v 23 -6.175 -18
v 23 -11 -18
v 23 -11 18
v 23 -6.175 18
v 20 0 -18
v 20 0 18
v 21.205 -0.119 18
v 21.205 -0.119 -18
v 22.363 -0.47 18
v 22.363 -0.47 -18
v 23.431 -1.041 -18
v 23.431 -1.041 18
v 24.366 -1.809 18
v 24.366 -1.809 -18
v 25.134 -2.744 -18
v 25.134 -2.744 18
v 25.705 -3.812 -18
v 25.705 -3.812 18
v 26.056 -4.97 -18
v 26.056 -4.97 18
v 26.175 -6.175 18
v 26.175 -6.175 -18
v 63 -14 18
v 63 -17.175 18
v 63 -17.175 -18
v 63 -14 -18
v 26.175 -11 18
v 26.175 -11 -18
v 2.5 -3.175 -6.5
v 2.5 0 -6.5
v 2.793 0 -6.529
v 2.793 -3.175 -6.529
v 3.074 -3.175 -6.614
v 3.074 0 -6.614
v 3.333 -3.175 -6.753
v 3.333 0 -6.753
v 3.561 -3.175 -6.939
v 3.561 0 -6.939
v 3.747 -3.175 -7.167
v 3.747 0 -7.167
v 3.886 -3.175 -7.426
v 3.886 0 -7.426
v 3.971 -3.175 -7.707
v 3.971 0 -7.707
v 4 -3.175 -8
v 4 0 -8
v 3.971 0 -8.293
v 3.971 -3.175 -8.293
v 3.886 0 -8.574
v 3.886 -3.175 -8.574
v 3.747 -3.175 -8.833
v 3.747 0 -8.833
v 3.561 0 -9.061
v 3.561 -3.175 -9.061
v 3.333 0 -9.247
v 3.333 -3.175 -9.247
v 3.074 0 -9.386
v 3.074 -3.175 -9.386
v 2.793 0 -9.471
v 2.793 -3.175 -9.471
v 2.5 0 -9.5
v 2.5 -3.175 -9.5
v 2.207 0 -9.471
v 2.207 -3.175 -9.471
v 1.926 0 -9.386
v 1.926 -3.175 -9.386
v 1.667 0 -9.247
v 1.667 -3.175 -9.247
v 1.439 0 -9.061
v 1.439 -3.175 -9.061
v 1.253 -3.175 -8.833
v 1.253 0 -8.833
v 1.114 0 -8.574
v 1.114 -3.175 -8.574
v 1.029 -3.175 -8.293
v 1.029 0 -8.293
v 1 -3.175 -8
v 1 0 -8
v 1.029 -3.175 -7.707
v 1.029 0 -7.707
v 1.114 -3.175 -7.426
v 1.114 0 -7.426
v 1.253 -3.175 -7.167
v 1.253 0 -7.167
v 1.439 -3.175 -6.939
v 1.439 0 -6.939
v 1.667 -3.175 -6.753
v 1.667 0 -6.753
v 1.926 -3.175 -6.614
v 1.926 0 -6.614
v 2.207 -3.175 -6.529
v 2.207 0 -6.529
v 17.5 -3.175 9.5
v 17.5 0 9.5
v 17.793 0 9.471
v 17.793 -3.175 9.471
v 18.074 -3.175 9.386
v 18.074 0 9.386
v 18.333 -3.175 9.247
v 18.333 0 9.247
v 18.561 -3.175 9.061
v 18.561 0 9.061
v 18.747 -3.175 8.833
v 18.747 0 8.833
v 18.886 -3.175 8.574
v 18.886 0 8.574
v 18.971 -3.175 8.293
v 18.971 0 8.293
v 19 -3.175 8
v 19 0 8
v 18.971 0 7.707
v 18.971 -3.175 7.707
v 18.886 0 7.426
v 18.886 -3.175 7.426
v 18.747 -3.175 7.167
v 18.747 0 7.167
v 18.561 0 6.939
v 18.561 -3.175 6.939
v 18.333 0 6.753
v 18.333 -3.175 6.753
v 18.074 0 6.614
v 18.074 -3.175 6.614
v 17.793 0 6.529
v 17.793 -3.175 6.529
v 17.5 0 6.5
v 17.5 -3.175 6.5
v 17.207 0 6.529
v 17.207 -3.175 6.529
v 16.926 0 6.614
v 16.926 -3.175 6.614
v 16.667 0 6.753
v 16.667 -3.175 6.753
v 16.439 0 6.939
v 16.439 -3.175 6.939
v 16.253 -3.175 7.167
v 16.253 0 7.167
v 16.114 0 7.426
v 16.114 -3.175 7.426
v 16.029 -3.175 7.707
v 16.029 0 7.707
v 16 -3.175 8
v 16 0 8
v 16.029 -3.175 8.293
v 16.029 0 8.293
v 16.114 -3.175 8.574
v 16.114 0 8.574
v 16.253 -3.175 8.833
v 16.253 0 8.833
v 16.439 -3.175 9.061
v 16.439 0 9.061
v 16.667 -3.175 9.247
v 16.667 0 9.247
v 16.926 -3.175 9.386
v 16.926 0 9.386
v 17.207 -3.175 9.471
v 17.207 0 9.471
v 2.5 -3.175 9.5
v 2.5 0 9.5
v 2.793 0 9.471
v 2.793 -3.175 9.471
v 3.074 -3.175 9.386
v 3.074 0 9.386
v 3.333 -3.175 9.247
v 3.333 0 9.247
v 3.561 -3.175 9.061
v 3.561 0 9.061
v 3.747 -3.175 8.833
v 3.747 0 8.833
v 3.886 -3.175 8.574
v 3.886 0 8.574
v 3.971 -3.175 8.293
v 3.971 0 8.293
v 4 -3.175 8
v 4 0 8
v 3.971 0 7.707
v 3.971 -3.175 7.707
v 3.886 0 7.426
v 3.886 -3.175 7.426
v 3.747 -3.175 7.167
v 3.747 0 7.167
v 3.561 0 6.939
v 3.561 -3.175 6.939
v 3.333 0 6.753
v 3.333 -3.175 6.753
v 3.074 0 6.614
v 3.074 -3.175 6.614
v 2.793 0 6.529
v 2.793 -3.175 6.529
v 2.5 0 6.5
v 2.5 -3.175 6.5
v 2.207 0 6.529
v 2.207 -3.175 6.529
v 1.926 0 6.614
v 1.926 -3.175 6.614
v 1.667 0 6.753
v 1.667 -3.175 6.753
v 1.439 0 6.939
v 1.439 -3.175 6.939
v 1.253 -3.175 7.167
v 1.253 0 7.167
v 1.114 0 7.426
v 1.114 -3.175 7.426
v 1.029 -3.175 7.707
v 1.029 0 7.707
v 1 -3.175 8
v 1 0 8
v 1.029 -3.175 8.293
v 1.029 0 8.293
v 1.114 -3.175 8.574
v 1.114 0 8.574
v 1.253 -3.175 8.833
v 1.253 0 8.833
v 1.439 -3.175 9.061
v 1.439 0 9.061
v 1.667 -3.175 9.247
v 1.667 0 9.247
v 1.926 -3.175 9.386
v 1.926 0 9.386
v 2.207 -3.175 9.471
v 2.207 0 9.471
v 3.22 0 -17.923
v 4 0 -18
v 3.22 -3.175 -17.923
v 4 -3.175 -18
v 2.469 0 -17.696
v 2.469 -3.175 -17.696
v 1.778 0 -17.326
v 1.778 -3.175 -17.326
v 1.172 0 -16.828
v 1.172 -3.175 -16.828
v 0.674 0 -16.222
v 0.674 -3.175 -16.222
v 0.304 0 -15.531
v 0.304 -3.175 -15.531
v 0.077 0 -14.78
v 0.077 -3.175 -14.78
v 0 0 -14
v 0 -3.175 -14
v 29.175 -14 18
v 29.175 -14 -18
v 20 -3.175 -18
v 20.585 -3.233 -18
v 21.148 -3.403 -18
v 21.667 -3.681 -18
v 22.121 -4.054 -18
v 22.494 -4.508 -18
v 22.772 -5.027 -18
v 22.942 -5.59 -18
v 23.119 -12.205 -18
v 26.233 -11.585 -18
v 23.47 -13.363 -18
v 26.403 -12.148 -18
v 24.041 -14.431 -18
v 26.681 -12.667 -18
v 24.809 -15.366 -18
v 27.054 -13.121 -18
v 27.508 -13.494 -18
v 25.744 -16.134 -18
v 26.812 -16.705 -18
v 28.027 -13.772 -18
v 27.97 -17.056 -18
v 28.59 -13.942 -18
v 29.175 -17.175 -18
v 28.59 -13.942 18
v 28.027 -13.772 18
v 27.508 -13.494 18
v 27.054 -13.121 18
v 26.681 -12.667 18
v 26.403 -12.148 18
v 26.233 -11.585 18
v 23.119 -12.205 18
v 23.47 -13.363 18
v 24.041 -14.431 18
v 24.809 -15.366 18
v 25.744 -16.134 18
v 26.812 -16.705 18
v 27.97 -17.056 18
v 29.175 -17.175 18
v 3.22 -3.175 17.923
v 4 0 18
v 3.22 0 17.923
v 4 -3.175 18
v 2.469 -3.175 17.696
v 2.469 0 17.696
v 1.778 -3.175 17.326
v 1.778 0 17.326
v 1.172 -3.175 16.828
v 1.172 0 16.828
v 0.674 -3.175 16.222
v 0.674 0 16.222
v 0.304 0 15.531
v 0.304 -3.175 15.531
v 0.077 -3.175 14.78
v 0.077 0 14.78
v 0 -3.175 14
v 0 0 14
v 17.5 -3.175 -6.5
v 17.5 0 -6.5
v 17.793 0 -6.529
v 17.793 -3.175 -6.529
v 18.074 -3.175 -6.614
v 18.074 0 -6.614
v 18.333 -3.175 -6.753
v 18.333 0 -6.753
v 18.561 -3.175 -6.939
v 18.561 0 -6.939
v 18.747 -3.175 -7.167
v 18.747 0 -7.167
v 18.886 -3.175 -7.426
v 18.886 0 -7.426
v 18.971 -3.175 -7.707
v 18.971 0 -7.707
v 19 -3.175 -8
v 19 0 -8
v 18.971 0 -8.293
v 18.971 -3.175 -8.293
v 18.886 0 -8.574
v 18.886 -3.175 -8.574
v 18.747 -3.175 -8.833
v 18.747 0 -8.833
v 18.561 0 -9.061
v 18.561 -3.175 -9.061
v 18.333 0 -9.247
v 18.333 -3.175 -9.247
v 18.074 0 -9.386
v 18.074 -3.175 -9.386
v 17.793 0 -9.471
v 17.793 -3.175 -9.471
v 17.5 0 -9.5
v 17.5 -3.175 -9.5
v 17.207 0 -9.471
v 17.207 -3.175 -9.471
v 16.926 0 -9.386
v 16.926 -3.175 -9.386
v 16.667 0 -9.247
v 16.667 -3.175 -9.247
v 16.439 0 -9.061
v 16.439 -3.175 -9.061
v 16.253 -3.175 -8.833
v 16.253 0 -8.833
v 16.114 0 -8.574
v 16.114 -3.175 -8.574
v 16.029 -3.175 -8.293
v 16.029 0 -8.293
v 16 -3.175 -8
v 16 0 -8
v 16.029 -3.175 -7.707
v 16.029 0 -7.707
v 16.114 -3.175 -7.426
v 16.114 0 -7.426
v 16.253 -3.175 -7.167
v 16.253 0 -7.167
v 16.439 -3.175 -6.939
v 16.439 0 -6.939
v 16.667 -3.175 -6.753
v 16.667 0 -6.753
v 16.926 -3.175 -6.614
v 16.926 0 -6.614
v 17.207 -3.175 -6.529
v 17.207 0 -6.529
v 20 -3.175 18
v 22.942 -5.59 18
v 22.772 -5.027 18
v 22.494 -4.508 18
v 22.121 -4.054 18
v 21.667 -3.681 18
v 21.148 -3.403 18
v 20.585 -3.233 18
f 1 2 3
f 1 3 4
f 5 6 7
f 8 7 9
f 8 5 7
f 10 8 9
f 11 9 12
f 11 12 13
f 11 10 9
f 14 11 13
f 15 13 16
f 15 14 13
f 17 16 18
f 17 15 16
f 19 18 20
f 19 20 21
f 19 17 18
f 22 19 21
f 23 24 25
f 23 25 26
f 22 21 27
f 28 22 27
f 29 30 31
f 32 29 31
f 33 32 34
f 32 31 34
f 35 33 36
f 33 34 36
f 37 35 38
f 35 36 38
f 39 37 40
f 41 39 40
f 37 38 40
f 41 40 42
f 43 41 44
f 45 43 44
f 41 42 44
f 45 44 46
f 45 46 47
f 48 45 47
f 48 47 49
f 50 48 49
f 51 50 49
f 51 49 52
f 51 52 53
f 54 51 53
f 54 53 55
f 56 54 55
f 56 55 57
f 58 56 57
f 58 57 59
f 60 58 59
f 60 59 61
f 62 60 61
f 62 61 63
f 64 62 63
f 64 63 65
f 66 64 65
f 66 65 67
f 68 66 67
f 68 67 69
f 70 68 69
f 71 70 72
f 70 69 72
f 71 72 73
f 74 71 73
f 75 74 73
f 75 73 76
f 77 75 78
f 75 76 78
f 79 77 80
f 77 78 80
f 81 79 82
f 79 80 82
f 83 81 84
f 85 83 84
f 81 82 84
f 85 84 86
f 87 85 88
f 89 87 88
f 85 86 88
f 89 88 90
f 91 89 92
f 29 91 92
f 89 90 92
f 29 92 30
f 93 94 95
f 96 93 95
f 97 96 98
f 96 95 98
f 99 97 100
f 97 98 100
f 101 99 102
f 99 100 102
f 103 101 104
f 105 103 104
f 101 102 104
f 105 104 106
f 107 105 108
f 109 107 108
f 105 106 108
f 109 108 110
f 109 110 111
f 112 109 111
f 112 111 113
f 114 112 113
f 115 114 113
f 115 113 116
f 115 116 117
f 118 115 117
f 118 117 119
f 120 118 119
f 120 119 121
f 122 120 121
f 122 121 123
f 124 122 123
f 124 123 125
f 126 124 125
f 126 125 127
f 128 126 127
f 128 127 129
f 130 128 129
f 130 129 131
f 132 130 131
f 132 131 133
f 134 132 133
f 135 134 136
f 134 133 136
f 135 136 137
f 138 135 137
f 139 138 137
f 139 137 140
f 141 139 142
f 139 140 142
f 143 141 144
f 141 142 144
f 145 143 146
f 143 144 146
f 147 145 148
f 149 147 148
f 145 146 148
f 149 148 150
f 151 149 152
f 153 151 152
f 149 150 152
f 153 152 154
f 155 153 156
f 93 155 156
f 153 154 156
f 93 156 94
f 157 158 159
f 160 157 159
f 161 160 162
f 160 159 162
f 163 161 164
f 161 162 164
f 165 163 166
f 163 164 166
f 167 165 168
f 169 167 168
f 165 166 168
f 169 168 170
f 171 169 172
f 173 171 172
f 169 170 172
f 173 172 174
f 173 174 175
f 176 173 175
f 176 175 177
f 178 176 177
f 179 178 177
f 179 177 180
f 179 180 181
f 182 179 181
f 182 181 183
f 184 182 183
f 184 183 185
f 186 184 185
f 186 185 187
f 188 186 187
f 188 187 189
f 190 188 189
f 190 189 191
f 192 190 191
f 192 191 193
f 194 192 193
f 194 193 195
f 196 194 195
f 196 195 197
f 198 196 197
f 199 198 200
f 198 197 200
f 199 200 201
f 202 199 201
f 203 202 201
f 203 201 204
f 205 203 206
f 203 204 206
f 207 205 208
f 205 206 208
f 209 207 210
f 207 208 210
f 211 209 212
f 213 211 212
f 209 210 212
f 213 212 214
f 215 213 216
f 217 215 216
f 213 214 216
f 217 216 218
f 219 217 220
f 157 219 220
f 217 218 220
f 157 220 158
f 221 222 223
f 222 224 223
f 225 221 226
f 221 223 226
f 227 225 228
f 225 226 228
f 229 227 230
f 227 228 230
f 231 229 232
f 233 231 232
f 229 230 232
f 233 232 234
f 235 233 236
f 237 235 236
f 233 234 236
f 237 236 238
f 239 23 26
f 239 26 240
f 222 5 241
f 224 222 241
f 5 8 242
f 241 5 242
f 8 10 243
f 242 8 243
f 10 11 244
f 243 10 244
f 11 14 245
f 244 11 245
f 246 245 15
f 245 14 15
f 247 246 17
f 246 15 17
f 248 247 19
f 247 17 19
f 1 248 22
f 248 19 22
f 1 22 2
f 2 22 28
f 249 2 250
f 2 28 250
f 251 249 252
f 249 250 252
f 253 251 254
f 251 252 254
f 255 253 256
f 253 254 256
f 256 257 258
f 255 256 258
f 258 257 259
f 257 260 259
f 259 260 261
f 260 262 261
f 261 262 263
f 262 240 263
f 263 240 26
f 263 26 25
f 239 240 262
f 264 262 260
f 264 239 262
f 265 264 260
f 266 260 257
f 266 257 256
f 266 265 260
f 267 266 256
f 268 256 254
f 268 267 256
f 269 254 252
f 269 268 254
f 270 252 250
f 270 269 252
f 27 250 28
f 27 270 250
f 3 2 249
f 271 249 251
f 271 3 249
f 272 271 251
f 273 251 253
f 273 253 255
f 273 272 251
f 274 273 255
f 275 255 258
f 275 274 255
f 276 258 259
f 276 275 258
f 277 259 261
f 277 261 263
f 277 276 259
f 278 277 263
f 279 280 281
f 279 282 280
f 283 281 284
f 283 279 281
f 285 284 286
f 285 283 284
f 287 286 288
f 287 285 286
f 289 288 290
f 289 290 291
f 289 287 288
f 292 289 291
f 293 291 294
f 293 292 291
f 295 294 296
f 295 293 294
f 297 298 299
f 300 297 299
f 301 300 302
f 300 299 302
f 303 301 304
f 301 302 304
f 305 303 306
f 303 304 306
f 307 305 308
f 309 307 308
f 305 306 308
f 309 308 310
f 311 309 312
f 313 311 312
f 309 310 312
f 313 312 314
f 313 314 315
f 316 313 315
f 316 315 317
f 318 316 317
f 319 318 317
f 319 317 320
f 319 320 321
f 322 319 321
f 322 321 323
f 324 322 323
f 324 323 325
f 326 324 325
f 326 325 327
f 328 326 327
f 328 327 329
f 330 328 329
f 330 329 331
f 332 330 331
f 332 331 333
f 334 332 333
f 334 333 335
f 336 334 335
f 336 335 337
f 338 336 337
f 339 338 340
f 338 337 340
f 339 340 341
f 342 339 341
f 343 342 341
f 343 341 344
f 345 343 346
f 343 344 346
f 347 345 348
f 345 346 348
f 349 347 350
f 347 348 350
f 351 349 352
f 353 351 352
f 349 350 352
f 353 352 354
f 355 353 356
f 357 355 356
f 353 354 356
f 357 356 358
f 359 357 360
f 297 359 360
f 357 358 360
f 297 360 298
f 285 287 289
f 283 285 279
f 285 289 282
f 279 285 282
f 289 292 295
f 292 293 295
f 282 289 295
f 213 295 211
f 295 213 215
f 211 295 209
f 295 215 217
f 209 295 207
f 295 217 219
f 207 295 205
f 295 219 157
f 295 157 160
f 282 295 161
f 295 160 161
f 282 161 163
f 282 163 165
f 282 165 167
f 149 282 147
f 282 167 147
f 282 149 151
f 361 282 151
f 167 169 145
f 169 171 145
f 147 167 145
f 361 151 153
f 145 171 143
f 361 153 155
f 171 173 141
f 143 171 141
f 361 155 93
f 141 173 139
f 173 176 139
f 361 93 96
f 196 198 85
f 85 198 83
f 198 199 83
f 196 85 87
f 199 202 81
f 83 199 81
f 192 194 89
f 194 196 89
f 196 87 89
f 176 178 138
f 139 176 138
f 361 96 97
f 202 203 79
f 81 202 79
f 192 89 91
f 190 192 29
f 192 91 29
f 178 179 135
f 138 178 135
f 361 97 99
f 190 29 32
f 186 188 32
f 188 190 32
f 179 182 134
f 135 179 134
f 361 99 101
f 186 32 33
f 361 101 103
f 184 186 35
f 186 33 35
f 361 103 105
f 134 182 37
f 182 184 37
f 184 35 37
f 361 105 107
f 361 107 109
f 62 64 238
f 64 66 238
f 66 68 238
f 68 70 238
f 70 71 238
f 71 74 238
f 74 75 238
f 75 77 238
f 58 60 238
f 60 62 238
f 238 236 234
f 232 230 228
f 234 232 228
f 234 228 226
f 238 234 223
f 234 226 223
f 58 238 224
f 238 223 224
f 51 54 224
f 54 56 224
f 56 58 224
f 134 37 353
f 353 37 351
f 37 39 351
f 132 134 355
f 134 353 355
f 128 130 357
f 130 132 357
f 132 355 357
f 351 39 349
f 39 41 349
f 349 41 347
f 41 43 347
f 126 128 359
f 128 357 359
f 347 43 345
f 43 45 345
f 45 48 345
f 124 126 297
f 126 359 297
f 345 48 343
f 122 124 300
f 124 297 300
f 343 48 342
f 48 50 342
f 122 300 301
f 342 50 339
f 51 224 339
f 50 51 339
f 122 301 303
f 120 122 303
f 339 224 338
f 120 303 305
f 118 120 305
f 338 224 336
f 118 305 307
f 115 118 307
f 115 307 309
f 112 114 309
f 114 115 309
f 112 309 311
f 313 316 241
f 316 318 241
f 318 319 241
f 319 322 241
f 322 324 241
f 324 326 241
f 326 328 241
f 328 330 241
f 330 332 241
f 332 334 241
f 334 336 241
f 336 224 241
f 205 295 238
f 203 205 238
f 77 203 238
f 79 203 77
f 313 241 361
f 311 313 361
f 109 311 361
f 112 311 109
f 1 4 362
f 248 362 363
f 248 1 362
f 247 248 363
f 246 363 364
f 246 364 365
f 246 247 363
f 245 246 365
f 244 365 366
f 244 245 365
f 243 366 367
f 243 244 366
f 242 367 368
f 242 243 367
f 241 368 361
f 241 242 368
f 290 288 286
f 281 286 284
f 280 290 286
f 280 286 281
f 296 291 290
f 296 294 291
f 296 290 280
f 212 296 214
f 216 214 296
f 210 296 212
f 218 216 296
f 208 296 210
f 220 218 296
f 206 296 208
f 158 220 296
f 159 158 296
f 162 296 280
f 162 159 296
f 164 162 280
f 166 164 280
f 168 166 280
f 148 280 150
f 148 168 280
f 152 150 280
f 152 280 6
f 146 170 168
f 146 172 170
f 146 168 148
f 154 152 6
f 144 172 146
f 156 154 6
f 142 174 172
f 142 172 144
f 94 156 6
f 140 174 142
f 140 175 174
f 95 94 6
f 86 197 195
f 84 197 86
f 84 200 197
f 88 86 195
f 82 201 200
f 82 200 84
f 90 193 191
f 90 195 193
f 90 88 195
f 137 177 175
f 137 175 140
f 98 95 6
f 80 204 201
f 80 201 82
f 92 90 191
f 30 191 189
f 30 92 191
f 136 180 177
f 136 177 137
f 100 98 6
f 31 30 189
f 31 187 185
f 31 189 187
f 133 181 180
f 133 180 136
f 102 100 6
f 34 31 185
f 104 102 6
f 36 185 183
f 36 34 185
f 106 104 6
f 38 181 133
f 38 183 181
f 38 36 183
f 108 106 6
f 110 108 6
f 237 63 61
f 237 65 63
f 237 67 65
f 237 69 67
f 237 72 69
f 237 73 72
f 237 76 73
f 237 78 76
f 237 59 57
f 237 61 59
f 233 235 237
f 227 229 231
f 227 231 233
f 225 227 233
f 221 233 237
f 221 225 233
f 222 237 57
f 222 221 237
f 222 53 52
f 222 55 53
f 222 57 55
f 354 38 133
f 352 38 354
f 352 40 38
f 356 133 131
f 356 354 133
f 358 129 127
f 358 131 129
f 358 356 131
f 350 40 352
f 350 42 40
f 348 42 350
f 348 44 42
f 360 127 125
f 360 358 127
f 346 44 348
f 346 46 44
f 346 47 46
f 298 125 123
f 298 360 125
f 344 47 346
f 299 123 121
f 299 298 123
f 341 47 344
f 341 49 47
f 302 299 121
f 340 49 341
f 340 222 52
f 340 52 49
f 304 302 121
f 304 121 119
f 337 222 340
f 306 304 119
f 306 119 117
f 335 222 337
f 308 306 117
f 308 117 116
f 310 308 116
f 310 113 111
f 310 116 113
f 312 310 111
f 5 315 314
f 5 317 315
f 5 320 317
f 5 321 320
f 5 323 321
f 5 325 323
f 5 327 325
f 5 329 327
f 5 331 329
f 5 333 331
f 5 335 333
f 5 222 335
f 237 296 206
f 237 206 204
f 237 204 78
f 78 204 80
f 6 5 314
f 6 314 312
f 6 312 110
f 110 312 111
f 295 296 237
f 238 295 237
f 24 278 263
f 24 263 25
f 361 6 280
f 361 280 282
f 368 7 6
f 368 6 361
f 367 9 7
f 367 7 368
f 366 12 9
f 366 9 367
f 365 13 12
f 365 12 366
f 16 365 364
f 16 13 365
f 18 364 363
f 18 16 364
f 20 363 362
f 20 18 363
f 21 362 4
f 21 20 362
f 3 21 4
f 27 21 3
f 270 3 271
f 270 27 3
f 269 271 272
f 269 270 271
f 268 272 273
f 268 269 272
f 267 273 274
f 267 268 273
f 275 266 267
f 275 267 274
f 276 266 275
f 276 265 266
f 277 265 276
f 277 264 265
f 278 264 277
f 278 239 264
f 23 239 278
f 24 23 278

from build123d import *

# Parameters (mm, degrees)
SKETCH2_W                    = 23
SKETCH2_H                    = 36
BASE_FLANGE1_DEPTH           = 3.175
EDGE_FLANGE4_STRIP_W         = 18.7
EDGE_FLANGE4_STRIP_H         = 3.175
EDGE_FLANGE4_STRIP_CUT_DEPTH = 36
EDGE_FLANGE4_DEPTH           = 36
EDGE_FLANGE5_STRIP_W         = 18.7
EDGE_FLANGE5_STRIP_H         = 3.175
EDGE_FLANGE5_STRIP_CUT_DEPTH = 36
EDGE_FLANGE5_DEPTH           = 36
SKETCH20_R                   = 1.5
CUT_EXTRUDE1_DEPTH           = 68.734633866
FILLET1_R                    = 4


# Sheet-metal steps are written as plain solids
with BuildPart() as part:
    # Sketch2 → Base-Flange1 (new body)
    with BuildSketch(Plane(origin=(0, 0, 0), x_dir=(1, 0, 0), z_dir=(0, 1, 0))):
        with Locations((11.5, 0)):
            Rectangle(SKETCH2_W, SKETCH2_H)
    extrude(amount=-BASE_FLANGE1_DEPTH)

    # Edge-Flange4 strip (across the edge) → Edge-Flange4 strip cut (cut)
    with BuildSketch(Plane(origin=(23, -3.175, -18), x_dir=(-1, 0, 0), z_dir=(0, 0, 1))):
        with Locations((-6.35, -1.5875)):
            Rectangle(EDGE_FLANGE4_STRIP_W, EDGE_FLANGE4_STRIP_H)
    extrude(amount=EDGE_FLANGE4_STRIP_CUT_DEPTH, mode=Mode.SUBTRACT)

    # Edge-Flange4 section (across the edge) → Edge-Flange4 (add)
    with BuildSketch(Plane(origin=(23, -3.175, -18), x_dir=(-1, 0, 0), z_dir=(0, 0, 1))):
        with BuildLine():
            Line((-3.175, 3), (-3.175, 10.825))
            Line((-3.175, 10.825), (0, 10.825))
            Line((0, 10.825), (0, 3))
            ThreePointArc((0, 3), (0.878679656, 0.878679656), (3, 0))
            Line((3, 0), (3, -3.175))
            ThreePointArc((3, -3.175), (-1.366384374, -1.366384374), (-3.175, 3))
        make_face()
    extrude(amount=EDGE_FLANGE4_DEPTH)

    # Edge-Flange5 strip (across the edge) → Edge-Flange5 strip cut (cut)
    with BuildSketch(Plane(origin=(26.175, -14, 18), x_dir=(0, 1, 0), z_dir=(0, 0, -1))):
        with Locations((-6.35, -1.5875)):
            Rectangle(EDGE_FLANGE5_STRIP_W, EDGE_FLANGE5_STRIP_H)
    extrude(amount=EDGE_FLANGE5_STRIP_CUT_DEPTH, mode=Mode.SUBTRACT)

    # Edge-Flange5 section (across the edge) → Edge-Flange5 (add)
    with BuildSketch(Plane(origin=(26.175, -14, 18), x_dir=(0, 1, 0), z_dir=(0, 0, -1))):
        with BuildLine():
            Line((-3.175, 3), (-3.175, 36.825))
            Line((-3.175, 36.825), (0, 36.825))
            Line((0, 36.825), (0, 3))
            ThreePointArc((0, 3), (0.878679656, 0.878679656), (3, 0))
            Line((3, 0), (3, -3.175))
            ThreePointArc((3, -3.175), (-1.366384374, -1.366384374), (-3.175, 3))
        make_face()
    extrude(amount=EDGE_FLANGE5_DEPTH)

    # Sketch20 → Cut-Extrude1 (cut, through all)
    with BuildSketch(Plane(origin=(0, 0, 0), x_dir=(1, 0, 0), z_dir=(0, 1, 0))):
        with Locations(Location((17.5, -8, 0), (0, 0, 270))):
            Circle(SKETCH20_R)
        with Locations(Location((17.5, 8, 0), (0, 0, 270))):
            Circle(SKETCH20_R)
        with Locations(Location((2.5, 8, 0), (0, 0, 270))):
            Circle(SKETCH20_R)
        with Locations(Location((2.5, -8, 0), (0, 0, 270))):
            Circle(SKETCH20_R)
    extrude(amount=-CUT_EXTRUDE1_DEPTH, mode=Mode.SUBTRACT)

    # Fillet1
    fillet1_edges = [part.edges().sort_by_distance(p)[0] for p in [
        (0, -1.5875, 18),
        (0, -1.5875, -18),
    ]]
    fillet(fillet1_edges, radius=FILLET1_R)


solid = part.part
